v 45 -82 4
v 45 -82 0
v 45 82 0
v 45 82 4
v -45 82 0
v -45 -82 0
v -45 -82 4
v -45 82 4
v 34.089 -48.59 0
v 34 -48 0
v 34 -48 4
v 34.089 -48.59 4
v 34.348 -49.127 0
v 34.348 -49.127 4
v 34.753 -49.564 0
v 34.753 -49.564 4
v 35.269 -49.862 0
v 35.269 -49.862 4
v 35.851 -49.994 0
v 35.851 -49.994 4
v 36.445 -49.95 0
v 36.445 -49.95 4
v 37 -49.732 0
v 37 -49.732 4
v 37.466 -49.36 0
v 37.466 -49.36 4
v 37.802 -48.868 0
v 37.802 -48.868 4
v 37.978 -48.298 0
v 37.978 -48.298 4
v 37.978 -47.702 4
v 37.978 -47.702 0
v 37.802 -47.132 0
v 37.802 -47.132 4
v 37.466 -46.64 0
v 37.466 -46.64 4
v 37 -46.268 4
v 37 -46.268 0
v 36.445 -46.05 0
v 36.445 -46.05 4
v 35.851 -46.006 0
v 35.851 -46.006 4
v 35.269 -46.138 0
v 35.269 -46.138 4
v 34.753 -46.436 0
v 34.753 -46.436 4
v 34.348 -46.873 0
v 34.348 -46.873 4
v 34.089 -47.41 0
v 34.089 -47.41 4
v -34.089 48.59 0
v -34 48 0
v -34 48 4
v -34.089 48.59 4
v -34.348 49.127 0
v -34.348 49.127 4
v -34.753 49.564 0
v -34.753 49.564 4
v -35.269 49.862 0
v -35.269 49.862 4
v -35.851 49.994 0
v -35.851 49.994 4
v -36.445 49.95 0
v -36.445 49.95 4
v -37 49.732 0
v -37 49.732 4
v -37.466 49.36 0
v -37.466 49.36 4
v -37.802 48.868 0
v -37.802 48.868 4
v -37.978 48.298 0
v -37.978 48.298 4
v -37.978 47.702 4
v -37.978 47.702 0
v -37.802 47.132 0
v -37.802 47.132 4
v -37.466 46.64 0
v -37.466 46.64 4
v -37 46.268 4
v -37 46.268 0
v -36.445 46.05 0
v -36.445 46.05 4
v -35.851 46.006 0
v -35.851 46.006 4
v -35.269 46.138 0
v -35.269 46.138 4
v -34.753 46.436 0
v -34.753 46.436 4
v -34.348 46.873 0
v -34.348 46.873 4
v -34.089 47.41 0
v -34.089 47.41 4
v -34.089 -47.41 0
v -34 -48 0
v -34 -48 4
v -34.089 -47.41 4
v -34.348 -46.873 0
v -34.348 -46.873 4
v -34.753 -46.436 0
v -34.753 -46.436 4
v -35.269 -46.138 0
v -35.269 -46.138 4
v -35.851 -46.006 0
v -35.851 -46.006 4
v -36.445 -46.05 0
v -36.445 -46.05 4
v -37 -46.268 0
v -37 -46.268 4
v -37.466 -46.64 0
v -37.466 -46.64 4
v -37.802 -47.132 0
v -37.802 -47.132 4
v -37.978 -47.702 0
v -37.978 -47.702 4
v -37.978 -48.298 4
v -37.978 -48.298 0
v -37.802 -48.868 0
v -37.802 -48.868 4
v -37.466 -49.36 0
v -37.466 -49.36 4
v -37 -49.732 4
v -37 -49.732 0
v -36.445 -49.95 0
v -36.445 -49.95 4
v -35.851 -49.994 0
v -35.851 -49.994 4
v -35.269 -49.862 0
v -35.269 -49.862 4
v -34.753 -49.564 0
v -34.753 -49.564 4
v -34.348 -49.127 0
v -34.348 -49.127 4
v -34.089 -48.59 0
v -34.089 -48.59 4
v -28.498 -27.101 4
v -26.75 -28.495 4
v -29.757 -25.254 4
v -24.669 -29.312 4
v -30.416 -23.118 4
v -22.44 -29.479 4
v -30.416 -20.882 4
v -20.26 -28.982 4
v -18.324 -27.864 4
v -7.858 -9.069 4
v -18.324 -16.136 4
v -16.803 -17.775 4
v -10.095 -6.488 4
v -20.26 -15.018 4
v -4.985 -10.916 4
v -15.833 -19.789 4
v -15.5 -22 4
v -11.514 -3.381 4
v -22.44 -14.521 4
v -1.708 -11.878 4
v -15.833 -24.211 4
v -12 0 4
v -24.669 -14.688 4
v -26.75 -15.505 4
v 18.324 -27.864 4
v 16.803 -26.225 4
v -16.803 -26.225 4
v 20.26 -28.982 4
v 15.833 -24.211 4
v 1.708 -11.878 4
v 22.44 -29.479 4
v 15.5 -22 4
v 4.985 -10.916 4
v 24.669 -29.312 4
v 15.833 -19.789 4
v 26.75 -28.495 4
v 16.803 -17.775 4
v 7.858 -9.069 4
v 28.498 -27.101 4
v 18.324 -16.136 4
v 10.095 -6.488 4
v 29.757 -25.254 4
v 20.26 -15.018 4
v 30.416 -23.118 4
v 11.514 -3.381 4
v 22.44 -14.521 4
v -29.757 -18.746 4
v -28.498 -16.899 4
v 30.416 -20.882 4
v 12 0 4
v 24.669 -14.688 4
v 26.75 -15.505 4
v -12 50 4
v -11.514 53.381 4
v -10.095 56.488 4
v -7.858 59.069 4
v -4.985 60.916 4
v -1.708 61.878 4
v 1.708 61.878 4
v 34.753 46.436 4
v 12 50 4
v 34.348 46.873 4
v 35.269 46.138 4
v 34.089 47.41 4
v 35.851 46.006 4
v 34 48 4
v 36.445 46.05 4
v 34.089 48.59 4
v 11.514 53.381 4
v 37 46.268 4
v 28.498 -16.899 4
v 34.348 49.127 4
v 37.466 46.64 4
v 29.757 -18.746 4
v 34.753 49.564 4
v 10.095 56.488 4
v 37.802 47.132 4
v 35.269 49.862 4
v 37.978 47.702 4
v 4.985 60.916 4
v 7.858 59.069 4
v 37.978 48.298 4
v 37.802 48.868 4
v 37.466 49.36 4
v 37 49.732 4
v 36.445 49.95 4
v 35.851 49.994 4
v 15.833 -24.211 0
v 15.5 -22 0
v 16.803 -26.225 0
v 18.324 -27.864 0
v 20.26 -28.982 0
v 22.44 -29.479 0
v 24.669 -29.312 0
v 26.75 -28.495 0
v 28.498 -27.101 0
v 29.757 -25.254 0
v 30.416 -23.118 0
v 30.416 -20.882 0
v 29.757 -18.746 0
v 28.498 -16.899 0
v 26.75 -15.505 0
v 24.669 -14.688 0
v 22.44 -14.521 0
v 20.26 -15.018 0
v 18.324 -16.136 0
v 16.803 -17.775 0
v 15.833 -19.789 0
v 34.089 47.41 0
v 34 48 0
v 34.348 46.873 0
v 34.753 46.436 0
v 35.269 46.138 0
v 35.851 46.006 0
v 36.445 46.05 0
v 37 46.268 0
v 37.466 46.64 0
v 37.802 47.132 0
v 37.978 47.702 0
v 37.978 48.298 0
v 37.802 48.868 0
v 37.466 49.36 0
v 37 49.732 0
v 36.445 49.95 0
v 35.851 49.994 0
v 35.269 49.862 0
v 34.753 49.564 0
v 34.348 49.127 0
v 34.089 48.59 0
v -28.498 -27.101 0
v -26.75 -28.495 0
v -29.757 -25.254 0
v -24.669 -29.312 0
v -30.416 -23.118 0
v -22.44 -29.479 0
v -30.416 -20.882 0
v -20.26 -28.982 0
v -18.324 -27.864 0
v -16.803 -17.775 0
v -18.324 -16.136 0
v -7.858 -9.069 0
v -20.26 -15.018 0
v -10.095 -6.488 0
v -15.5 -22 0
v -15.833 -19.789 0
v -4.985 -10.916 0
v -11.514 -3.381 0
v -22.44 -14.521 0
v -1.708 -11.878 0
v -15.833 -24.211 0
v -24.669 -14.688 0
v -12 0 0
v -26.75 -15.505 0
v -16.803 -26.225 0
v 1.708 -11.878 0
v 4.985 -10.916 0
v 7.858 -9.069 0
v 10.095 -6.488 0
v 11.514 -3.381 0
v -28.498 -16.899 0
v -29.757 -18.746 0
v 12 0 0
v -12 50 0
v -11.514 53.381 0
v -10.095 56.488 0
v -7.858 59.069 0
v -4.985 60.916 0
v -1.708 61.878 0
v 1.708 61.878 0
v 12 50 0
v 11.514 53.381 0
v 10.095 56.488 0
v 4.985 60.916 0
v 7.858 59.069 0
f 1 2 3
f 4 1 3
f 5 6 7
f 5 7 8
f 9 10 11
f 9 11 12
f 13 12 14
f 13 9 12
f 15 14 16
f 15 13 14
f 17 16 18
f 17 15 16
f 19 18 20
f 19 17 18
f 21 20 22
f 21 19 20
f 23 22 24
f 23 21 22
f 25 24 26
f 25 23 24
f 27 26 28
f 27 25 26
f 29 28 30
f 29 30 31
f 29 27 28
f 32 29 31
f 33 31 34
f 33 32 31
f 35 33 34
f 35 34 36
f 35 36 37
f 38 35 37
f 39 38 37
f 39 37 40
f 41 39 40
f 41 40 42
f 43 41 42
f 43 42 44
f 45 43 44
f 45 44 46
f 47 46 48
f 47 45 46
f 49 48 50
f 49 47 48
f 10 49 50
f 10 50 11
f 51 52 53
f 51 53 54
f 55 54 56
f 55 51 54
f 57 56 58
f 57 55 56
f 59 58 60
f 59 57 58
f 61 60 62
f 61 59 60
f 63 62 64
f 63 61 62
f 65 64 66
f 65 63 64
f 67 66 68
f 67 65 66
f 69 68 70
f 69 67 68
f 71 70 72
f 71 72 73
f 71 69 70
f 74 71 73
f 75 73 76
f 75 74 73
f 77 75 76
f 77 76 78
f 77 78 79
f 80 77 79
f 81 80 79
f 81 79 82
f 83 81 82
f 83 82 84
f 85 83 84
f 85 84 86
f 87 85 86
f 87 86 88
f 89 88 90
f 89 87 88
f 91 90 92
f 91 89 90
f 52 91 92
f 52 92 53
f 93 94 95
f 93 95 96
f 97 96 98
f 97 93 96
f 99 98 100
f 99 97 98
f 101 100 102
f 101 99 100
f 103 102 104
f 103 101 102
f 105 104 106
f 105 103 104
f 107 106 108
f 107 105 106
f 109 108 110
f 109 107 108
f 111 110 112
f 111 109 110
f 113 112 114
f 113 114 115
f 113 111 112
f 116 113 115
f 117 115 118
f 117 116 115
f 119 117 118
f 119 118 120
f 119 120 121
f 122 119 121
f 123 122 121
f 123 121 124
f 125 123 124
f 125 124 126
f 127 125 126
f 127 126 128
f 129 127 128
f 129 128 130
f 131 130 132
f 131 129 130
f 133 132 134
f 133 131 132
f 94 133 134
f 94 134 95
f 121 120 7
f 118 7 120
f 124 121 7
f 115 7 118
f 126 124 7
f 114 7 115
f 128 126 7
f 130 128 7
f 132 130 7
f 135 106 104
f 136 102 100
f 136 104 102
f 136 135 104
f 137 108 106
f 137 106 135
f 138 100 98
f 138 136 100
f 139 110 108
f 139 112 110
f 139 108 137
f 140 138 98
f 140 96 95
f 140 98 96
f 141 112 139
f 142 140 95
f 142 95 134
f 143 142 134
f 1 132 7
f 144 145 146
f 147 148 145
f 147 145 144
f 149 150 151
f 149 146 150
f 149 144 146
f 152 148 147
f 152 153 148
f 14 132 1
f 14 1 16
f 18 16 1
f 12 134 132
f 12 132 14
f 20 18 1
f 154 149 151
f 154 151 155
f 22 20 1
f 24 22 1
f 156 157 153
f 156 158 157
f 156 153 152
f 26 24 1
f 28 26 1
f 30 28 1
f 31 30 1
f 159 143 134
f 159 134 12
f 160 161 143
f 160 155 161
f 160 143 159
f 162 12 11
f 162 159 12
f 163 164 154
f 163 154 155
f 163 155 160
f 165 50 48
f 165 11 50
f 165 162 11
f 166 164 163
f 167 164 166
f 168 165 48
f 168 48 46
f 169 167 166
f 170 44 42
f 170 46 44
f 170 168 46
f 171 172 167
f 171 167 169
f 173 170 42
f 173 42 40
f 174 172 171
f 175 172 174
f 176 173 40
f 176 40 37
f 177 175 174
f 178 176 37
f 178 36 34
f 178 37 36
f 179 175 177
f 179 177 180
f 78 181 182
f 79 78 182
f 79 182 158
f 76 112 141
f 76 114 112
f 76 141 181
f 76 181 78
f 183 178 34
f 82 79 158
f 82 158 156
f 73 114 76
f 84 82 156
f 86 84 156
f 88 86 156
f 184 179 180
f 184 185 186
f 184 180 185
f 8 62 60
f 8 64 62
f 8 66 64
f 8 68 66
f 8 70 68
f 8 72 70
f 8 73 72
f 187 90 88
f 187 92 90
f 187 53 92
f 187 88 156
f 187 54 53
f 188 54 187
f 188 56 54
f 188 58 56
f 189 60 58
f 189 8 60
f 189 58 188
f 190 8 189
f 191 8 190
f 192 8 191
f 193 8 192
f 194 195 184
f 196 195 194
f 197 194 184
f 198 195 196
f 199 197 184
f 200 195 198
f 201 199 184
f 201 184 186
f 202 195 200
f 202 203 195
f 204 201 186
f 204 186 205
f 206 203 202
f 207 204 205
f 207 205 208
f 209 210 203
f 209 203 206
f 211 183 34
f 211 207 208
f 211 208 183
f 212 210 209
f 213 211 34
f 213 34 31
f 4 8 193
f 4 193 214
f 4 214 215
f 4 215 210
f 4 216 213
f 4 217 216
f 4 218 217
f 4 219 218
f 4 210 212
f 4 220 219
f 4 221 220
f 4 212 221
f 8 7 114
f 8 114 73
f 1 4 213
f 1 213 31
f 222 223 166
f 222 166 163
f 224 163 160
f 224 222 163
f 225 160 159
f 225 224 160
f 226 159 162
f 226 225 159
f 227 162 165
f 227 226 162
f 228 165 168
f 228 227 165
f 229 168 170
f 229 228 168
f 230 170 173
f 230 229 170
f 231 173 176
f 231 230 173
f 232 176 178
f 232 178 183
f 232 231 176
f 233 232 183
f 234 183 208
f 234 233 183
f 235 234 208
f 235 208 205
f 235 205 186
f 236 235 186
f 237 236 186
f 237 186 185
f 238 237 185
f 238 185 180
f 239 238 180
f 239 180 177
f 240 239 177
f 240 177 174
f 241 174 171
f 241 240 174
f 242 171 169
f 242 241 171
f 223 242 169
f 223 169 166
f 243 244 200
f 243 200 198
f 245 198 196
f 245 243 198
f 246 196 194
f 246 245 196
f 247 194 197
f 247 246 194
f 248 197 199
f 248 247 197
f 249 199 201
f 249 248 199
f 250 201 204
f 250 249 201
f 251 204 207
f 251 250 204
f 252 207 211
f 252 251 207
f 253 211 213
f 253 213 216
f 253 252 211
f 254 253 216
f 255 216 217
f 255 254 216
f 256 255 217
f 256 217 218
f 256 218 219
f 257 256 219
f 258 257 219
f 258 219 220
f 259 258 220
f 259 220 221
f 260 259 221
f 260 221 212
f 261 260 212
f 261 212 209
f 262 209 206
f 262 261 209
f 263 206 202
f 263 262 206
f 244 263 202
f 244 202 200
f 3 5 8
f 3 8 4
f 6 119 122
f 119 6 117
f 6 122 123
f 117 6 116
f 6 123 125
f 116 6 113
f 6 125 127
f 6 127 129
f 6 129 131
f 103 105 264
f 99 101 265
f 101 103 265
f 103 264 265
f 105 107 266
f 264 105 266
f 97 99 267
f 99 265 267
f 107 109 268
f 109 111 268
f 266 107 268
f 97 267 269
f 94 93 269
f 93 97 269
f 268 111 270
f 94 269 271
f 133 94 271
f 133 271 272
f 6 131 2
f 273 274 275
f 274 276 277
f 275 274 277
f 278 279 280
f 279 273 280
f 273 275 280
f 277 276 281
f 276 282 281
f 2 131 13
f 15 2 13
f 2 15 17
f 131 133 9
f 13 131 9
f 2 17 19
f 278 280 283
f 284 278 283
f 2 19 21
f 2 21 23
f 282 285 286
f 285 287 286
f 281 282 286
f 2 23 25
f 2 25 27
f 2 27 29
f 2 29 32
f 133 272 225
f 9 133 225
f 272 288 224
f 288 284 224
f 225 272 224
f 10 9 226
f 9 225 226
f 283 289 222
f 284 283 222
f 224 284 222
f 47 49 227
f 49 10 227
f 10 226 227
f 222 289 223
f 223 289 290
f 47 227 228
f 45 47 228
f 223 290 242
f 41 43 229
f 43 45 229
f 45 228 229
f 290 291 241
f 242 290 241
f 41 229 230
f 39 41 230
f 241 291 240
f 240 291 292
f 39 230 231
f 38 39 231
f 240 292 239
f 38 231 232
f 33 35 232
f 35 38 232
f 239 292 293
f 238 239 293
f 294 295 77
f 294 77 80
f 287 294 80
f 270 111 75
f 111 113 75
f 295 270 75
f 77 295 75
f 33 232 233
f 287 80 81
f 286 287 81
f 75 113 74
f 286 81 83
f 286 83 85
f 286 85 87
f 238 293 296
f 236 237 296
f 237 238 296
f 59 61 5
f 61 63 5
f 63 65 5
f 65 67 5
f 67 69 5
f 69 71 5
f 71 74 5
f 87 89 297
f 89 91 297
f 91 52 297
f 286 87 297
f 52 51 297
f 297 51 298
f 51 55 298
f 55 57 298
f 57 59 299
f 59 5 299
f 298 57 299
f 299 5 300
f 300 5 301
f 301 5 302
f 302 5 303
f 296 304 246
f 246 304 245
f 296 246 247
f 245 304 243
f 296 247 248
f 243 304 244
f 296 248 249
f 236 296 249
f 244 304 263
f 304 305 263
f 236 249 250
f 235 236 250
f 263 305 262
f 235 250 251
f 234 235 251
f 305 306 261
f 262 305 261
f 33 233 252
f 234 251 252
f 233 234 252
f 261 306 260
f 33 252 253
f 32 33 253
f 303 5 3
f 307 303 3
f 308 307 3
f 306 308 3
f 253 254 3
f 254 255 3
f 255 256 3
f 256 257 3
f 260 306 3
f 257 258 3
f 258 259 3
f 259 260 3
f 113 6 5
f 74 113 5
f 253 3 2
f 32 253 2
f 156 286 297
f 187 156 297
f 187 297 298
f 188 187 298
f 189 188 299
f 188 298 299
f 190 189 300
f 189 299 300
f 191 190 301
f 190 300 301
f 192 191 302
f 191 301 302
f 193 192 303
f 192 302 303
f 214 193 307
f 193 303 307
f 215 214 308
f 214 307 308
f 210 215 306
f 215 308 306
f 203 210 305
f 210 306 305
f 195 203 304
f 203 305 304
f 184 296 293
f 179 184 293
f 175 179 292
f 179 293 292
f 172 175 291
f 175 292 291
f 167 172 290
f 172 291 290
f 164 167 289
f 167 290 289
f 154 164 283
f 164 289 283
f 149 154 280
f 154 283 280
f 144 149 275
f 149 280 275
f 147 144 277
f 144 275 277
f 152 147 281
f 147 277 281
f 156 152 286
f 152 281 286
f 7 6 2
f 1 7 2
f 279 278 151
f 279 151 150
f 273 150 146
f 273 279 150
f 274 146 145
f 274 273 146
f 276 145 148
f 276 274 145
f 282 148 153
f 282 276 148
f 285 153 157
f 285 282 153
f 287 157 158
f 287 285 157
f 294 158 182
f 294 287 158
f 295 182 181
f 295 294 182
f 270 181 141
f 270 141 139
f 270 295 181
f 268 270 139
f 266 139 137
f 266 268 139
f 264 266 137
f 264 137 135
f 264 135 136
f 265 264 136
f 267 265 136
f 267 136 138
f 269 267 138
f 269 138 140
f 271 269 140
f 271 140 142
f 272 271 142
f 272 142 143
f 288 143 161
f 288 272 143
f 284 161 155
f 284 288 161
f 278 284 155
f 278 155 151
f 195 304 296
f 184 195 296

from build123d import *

# Parameters (mm, degrees)
SKETCH_1_W      = 90
SKETCH_1_H      = 164
SKETCH_1_R      = 2
SKETCH_1_R_2    = 7.5
EXTRUDE_1_DEPTH = 4


with BuildPart() as part:
    # 草图1 → 凸台-拉伸1 (new body)
    with BuildSketch(Plane.XY):
        Rectangle(SKETCH_1_W, SKETCH_1_H)
        with Locations((-36, 48)):
            Circle(SKETCH_1_R, mode=Mode.SUBTRACT)
        with Locations((-36, -48)):
            Circle(SKETCH_1_R, mode=Mode.SUBTRACT)
        with Locations(Location((36, -48, 0), (0, 0, 180))):
            Circle(SKETCH_1_R, mode=Mode.SUBTRACT)
        with Locations(Location((36, 48, 0), (0, 0, 180))):
            Circle(SKETCH_1_R, mode=Mode.SUBTRACT)
        with Locations((-23, -22)):
            Circle(SKETCH_1_R_2, mode=Mode.SUBTRACT)
        with Locations(Location((23, -22, 0), (0, 0, 180))):
            Circle(SKETCH_1_R_2, mode=Mode.SUBTRACT)
        with BuildLine():
            Line((-12, 0), (-12, 50))
            ThreePointArc((-12, 50), (0, 62), (12, 50))
            Line((12, 50), (12, 0))
            ThreePointArc((12, 0), (0, -12), (-12, 0))
        make_face(mode=Mode.SUBTRACT)
    extrude(amount=EXTRUDE_1_DEPTH)


solid = part.part
